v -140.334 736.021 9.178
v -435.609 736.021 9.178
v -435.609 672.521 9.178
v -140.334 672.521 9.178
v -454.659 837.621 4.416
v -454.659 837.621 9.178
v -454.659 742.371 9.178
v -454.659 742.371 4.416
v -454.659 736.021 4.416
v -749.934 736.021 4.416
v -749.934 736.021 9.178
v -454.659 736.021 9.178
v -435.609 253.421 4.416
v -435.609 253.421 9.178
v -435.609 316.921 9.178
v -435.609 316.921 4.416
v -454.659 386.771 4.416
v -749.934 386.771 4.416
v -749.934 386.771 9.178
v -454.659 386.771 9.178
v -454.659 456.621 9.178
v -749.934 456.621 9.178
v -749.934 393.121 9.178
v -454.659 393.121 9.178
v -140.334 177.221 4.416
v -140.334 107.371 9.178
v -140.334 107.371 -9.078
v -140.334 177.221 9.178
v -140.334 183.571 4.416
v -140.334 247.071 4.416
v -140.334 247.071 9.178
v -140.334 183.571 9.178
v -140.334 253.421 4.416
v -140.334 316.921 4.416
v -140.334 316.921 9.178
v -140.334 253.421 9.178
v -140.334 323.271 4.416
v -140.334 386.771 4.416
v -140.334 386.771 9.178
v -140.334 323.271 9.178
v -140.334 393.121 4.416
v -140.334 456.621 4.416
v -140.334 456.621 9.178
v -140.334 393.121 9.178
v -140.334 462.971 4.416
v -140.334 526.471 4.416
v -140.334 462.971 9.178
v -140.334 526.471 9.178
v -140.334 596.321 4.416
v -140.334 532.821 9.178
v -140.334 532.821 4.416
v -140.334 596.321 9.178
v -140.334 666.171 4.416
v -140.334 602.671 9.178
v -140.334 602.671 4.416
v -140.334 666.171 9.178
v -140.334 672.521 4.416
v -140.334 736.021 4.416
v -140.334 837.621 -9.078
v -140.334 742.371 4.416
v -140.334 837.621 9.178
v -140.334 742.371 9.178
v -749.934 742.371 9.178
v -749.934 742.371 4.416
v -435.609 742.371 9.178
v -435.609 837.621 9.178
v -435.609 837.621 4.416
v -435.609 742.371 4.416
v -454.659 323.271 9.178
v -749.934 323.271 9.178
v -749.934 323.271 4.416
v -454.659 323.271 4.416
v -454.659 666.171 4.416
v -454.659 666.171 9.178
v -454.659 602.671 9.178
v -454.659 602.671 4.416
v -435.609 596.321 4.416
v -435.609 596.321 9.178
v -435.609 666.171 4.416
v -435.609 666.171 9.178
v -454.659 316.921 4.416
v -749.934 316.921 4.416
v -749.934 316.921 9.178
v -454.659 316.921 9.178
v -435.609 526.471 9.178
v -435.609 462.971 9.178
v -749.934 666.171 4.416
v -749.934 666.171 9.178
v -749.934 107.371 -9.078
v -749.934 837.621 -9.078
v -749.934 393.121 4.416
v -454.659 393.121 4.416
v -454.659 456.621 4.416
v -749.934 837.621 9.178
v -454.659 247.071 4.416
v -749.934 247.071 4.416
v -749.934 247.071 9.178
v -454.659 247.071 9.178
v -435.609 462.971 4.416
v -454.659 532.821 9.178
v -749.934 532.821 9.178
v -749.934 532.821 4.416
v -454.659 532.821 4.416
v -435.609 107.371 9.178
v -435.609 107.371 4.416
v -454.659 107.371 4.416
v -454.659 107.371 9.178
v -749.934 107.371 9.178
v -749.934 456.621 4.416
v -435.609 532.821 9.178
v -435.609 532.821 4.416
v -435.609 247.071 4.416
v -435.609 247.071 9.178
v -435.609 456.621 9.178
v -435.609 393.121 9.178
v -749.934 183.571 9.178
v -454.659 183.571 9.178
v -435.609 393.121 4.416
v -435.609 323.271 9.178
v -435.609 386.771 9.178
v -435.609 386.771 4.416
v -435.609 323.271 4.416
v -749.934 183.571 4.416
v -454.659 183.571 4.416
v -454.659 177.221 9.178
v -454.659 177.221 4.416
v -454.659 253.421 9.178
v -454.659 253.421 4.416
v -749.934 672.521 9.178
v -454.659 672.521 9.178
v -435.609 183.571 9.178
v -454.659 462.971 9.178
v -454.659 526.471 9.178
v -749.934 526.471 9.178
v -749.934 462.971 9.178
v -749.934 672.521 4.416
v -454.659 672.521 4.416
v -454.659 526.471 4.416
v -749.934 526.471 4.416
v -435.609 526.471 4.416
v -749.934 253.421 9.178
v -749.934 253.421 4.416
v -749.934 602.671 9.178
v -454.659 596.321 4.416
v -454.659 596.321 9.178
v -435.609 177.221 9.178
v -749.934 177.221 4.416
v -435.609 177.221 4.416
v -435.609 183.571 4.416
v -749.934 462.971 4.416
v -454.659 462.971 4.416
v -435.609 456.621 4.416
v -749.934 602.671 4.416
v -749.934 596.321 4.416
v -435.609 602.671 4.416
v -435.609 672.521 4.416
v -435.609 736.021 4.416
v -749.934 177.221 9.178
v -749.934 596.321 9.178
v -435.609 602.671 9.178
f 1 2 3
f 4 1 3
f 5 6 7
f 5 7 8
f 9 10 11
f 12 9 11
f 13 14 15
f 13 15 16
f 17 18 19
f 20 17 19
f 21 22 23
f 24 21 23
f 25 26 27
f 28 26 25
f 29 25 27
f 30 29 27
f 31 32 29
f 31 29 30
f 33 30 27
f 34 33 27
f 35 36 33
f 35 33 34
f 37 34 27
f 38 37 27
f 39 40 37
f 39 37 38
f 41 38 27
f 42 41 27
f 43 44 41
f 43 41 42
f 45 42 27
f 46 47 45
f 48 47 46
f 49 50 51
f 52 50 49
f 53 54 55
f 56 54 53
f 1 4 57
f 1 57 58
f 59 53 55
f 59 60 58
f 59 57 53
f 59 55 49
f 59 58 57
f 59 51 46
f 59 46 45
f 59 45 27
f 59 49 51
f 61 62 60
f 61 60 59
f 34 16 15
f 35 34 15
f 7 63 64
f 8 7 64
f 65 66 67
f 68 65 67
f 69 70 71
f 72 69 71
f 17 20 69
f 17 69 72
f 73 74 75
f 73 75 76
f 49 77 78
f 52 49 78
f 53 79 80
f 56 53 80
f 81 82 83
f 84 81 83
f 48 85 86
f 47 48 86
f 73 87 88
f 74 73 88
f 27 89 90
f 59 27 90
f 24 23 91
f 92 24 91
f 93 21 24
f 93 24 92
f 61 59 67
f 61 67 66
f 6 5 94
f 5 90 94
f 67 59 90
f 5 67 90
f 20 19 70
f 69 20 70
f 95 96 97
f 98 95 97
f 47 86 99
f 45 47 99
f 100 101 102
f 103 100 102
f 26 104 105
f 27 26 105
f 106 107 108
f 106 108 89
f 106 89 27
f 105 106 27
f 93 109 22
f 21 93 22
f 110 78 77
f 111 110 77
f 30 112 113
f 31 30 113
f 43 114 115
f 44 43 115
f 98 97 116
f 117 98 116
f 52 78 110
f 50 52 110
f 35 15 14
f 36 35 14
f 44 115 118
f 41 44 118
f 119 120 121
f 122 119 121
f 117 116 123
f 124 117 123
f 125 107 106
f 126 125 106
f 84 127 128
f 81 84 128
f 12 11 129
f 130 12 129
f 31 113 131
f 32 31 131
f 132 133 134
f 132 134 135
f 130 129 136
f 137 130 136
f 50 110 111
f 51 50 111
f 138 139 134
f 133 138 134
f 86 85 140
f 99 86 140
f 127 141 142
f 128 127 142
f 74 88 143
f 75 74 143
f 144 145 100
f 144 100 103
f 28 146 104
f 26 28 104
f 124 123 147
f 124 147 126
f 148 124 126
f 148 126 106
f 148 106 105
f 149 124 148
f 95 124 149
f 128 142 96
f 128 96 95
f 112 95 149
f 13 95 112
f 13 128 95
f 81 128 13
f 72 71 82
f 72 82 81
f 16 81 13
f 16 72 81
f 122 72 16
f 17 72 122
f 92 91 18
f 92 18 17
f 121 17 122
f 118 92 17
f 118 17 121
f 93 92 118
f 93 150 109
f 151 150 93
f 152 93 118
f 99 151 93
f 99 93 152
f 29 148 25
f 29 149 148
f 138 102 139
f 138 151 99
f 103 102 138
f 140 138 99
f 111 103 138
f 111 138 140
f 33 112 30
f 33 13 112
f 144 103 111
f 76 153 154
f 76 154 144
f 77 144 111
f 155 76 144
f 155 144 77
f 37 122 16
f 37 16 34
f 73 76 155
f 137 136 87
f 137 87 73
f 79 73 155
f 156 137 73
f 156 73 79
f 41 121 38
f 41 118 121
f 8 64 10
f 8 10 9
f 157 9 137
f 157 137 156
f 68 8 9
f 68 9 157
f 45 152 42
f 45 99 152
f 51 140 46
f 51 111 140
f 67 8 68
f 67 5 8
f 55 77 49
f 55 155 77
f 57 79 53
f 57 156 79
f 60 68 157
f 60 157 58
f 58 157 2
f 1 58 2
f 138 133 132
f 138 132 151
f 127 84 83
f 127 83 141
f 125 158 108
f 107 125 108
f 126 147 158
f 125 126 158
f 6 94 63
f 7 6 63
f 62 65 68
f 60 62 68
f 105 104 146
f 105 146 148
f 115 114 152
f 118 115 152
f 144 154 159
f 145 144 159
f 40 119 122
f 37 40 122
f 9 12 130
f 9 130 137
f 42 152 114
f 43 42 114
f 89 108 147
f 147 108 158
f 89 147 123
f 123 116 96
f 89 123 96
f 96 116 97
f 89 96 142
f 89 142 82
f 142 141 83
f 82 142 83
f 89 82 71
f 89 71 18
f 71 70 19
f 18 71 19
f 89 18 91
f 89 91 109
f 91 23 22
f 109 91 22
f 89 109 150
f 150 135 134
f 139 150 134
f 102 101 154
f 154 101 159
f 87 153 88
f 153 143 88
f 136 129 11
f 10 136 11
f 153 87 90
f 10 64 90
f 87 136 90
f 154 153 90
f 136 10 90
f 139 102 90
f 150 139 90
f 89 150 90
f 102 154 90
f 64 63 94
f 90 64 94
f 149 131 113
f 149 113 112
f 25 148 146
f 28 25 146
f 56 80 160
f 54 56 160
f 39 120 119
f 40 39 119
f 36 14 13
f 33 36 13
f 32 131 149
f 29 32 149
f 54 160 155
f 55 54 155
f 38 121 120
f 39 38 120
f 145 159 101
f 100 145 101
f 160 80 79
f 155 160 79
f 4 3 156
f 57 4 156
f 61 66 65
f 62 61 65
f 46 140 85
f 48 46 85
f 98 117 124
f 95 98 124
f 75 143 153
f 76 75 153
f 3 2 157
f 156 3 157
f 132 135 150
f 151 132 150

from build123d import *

# Parameters (mm, degrees)
PARTSCAB_REFERENCE_START = -1615.650675561
PARTSCAB_REFERENCE_DEPTH = 1475.316666667
SKETCH1_OUTSIDE_W        = 1806.569
SKETCH1_OUTSIDE_H        = 1061.502
SKETCH1_OUTSIDE_W_2      = 609.6
SKETCH1_OUTSIDE_H_2      = 730.25
CUT_EXTRUDE1_DEPTH       = 1820.964329577
SKETCH3_W                = 19.05
SKETCH3_H                = 4.7625
CUT_EXTRUDE3_DEPTH       = 1047.78093132
SKETCH4_W                = 609.6
SKETCH4_H                = 4.7625
BOSS_EXTRUDE1_DEPTH      = 730.25


# Read off the part's stored shape, not the designer's step: PartsCab_Reference
with BuildPart() as part:
    # PartsCab_Reference outline → PartsCab_Reference (new body)
    with BuildSketch(Plane.YZ.offset(PARTSCAB_REFERENCE_START)):
        Polygon((107.371492578, 9.178125), (107.371492578, -9.078125), (177.221492578, -9.078125), (177.221492578, -4.315625), (183.571492578, -4.315625), (183.571492578, -9.078125), (247.071492578, -9.078125), (247.071492578, -4.315625), (253.421492578, -4.315625), (253.421492578, -9.078125), (316.921492578, -9.078125), (316.921492578, -4.315625), (323.271492578, -4.315625), (323.271492578, -9.078125), (386.771492578, -9.078125), (386.771492578, -4.315625), (393.121492578, -4.315625), (393.121492578, -9.078125), (456.621492578, -9.078125), (456.621492578, -4.315625), (462.971492578, -4.315625), (462.971492578, -9.078125), (526.471492578, -9.078125), (526.471492578, -4.315625), (532.821492578, -4.315625), (532.821492578, -9.078125), (596.321492578, -9.078125), (596.321492578, -4.315625), (602.671492578, -4.315625), (602.671492578, -9.078125), (666.171492578, -9.078125), (666.171492578, -4.315625), (672.521492578, -4.315625), (672.521492578, -9.078125), (736.021492578, -9.078125), (736.021492578, -4.315625), (742.371492578, -4.315625), (742.371492578, -9.078125), (837.621492578, -9.078125), (837.621492578, 9.178125), (742.371492578, 9.178125), (742.371492578, 4.415625), (736.021492578, 4.415625), (736.021492578, 9.178125), (672.521492578, 9.178125), (672.521492578, 4.415625), (666.171492578, 4.415625), (666.171492578, 9.178125), (602.671492578, 9.178125), (602.671492578, 4.415625), (596.321492578, 4.415625), (596.321492578, 9.178125), (532.821492578, 9.178125), (532.821492578, 4.415625), (526.471492578, 4.415625), (526.471492578, 9.178125), (462.971492578, 9.178125), (462.971492578, 4.415625), (456.621492578, 4.415625), (456.621492578, 9.178125), (393.121492578, 9.178125), (393.121492578, 4.415625), (386.771492578, 4.415625), (386.771492578, 9.178125), (323.271492578, 9.178125), (323.271492578, 4.415625), (316.921492578, 4.415625), (316.921492578, 9.178125), (253.421492578, 9.178125), (253.421492578, 4.415625), (247.071492578, 4.415625), (247.071492578, 9.178125), (183.571492578, 9.178125), (183.571492578, 4.415625), (177.221492578, 4.415625), (177.221492578, 9.178125), align=None)
    extrude(amount=PARTSCAB_REFERENCE_DEPTH)

    # Sketch1 outside → Cut-Extrude1 (cut, through all)
    with BuildSketch(Plane.XY.offset(9.178125)):
        with Locations((-877.9925, 472.496)):
            Rectangle(SKETCH1_OUTSIDE_W, SKETCH1_OUTSIDE_H)
        with Locations((-445.134008894, 472.496492578)):
            Rectangle(SKETCH1_OUTSIDE_W_2, SKETCH1_OUTSIDE_H_2, mode=Mode.SUBTRACT)
    extrude(amount=-CUT_EXTRUDE1_DEPTH, mode=Mode.SUBTRACT)

    # Sketch3 → Cut-Extrude3 (cut, through all)
    with BuildSketch(Plane(origin=(0, 837.621492578, 0), x_dir=(1, 0, 0), z_dir=(0, 1, 0))):
        with Locations((-445.134008894, -6.796875)):
            Rectangle(SKETCH3_W, SKETCH3_H)
    extrude(amount=-CUT_EXTRUDE3_DEPTH, mode=Mode.SUBTRACT)

    # Sketch4 → Boss-Extrude1 (add)
    with BuildSketch(Plane(origin=(0, 837.621492578, 0), x_dir=(1, 0, 0), z_dir=(0, 1, 0))):
        with Locations((-445.134008894, 6.696875)):
            Rectangle(SKETCH4_W, SKETCH4_H)
    extrude(amount=-BOSS_EXTRUDE1_DEPTH)


solid = part.part
